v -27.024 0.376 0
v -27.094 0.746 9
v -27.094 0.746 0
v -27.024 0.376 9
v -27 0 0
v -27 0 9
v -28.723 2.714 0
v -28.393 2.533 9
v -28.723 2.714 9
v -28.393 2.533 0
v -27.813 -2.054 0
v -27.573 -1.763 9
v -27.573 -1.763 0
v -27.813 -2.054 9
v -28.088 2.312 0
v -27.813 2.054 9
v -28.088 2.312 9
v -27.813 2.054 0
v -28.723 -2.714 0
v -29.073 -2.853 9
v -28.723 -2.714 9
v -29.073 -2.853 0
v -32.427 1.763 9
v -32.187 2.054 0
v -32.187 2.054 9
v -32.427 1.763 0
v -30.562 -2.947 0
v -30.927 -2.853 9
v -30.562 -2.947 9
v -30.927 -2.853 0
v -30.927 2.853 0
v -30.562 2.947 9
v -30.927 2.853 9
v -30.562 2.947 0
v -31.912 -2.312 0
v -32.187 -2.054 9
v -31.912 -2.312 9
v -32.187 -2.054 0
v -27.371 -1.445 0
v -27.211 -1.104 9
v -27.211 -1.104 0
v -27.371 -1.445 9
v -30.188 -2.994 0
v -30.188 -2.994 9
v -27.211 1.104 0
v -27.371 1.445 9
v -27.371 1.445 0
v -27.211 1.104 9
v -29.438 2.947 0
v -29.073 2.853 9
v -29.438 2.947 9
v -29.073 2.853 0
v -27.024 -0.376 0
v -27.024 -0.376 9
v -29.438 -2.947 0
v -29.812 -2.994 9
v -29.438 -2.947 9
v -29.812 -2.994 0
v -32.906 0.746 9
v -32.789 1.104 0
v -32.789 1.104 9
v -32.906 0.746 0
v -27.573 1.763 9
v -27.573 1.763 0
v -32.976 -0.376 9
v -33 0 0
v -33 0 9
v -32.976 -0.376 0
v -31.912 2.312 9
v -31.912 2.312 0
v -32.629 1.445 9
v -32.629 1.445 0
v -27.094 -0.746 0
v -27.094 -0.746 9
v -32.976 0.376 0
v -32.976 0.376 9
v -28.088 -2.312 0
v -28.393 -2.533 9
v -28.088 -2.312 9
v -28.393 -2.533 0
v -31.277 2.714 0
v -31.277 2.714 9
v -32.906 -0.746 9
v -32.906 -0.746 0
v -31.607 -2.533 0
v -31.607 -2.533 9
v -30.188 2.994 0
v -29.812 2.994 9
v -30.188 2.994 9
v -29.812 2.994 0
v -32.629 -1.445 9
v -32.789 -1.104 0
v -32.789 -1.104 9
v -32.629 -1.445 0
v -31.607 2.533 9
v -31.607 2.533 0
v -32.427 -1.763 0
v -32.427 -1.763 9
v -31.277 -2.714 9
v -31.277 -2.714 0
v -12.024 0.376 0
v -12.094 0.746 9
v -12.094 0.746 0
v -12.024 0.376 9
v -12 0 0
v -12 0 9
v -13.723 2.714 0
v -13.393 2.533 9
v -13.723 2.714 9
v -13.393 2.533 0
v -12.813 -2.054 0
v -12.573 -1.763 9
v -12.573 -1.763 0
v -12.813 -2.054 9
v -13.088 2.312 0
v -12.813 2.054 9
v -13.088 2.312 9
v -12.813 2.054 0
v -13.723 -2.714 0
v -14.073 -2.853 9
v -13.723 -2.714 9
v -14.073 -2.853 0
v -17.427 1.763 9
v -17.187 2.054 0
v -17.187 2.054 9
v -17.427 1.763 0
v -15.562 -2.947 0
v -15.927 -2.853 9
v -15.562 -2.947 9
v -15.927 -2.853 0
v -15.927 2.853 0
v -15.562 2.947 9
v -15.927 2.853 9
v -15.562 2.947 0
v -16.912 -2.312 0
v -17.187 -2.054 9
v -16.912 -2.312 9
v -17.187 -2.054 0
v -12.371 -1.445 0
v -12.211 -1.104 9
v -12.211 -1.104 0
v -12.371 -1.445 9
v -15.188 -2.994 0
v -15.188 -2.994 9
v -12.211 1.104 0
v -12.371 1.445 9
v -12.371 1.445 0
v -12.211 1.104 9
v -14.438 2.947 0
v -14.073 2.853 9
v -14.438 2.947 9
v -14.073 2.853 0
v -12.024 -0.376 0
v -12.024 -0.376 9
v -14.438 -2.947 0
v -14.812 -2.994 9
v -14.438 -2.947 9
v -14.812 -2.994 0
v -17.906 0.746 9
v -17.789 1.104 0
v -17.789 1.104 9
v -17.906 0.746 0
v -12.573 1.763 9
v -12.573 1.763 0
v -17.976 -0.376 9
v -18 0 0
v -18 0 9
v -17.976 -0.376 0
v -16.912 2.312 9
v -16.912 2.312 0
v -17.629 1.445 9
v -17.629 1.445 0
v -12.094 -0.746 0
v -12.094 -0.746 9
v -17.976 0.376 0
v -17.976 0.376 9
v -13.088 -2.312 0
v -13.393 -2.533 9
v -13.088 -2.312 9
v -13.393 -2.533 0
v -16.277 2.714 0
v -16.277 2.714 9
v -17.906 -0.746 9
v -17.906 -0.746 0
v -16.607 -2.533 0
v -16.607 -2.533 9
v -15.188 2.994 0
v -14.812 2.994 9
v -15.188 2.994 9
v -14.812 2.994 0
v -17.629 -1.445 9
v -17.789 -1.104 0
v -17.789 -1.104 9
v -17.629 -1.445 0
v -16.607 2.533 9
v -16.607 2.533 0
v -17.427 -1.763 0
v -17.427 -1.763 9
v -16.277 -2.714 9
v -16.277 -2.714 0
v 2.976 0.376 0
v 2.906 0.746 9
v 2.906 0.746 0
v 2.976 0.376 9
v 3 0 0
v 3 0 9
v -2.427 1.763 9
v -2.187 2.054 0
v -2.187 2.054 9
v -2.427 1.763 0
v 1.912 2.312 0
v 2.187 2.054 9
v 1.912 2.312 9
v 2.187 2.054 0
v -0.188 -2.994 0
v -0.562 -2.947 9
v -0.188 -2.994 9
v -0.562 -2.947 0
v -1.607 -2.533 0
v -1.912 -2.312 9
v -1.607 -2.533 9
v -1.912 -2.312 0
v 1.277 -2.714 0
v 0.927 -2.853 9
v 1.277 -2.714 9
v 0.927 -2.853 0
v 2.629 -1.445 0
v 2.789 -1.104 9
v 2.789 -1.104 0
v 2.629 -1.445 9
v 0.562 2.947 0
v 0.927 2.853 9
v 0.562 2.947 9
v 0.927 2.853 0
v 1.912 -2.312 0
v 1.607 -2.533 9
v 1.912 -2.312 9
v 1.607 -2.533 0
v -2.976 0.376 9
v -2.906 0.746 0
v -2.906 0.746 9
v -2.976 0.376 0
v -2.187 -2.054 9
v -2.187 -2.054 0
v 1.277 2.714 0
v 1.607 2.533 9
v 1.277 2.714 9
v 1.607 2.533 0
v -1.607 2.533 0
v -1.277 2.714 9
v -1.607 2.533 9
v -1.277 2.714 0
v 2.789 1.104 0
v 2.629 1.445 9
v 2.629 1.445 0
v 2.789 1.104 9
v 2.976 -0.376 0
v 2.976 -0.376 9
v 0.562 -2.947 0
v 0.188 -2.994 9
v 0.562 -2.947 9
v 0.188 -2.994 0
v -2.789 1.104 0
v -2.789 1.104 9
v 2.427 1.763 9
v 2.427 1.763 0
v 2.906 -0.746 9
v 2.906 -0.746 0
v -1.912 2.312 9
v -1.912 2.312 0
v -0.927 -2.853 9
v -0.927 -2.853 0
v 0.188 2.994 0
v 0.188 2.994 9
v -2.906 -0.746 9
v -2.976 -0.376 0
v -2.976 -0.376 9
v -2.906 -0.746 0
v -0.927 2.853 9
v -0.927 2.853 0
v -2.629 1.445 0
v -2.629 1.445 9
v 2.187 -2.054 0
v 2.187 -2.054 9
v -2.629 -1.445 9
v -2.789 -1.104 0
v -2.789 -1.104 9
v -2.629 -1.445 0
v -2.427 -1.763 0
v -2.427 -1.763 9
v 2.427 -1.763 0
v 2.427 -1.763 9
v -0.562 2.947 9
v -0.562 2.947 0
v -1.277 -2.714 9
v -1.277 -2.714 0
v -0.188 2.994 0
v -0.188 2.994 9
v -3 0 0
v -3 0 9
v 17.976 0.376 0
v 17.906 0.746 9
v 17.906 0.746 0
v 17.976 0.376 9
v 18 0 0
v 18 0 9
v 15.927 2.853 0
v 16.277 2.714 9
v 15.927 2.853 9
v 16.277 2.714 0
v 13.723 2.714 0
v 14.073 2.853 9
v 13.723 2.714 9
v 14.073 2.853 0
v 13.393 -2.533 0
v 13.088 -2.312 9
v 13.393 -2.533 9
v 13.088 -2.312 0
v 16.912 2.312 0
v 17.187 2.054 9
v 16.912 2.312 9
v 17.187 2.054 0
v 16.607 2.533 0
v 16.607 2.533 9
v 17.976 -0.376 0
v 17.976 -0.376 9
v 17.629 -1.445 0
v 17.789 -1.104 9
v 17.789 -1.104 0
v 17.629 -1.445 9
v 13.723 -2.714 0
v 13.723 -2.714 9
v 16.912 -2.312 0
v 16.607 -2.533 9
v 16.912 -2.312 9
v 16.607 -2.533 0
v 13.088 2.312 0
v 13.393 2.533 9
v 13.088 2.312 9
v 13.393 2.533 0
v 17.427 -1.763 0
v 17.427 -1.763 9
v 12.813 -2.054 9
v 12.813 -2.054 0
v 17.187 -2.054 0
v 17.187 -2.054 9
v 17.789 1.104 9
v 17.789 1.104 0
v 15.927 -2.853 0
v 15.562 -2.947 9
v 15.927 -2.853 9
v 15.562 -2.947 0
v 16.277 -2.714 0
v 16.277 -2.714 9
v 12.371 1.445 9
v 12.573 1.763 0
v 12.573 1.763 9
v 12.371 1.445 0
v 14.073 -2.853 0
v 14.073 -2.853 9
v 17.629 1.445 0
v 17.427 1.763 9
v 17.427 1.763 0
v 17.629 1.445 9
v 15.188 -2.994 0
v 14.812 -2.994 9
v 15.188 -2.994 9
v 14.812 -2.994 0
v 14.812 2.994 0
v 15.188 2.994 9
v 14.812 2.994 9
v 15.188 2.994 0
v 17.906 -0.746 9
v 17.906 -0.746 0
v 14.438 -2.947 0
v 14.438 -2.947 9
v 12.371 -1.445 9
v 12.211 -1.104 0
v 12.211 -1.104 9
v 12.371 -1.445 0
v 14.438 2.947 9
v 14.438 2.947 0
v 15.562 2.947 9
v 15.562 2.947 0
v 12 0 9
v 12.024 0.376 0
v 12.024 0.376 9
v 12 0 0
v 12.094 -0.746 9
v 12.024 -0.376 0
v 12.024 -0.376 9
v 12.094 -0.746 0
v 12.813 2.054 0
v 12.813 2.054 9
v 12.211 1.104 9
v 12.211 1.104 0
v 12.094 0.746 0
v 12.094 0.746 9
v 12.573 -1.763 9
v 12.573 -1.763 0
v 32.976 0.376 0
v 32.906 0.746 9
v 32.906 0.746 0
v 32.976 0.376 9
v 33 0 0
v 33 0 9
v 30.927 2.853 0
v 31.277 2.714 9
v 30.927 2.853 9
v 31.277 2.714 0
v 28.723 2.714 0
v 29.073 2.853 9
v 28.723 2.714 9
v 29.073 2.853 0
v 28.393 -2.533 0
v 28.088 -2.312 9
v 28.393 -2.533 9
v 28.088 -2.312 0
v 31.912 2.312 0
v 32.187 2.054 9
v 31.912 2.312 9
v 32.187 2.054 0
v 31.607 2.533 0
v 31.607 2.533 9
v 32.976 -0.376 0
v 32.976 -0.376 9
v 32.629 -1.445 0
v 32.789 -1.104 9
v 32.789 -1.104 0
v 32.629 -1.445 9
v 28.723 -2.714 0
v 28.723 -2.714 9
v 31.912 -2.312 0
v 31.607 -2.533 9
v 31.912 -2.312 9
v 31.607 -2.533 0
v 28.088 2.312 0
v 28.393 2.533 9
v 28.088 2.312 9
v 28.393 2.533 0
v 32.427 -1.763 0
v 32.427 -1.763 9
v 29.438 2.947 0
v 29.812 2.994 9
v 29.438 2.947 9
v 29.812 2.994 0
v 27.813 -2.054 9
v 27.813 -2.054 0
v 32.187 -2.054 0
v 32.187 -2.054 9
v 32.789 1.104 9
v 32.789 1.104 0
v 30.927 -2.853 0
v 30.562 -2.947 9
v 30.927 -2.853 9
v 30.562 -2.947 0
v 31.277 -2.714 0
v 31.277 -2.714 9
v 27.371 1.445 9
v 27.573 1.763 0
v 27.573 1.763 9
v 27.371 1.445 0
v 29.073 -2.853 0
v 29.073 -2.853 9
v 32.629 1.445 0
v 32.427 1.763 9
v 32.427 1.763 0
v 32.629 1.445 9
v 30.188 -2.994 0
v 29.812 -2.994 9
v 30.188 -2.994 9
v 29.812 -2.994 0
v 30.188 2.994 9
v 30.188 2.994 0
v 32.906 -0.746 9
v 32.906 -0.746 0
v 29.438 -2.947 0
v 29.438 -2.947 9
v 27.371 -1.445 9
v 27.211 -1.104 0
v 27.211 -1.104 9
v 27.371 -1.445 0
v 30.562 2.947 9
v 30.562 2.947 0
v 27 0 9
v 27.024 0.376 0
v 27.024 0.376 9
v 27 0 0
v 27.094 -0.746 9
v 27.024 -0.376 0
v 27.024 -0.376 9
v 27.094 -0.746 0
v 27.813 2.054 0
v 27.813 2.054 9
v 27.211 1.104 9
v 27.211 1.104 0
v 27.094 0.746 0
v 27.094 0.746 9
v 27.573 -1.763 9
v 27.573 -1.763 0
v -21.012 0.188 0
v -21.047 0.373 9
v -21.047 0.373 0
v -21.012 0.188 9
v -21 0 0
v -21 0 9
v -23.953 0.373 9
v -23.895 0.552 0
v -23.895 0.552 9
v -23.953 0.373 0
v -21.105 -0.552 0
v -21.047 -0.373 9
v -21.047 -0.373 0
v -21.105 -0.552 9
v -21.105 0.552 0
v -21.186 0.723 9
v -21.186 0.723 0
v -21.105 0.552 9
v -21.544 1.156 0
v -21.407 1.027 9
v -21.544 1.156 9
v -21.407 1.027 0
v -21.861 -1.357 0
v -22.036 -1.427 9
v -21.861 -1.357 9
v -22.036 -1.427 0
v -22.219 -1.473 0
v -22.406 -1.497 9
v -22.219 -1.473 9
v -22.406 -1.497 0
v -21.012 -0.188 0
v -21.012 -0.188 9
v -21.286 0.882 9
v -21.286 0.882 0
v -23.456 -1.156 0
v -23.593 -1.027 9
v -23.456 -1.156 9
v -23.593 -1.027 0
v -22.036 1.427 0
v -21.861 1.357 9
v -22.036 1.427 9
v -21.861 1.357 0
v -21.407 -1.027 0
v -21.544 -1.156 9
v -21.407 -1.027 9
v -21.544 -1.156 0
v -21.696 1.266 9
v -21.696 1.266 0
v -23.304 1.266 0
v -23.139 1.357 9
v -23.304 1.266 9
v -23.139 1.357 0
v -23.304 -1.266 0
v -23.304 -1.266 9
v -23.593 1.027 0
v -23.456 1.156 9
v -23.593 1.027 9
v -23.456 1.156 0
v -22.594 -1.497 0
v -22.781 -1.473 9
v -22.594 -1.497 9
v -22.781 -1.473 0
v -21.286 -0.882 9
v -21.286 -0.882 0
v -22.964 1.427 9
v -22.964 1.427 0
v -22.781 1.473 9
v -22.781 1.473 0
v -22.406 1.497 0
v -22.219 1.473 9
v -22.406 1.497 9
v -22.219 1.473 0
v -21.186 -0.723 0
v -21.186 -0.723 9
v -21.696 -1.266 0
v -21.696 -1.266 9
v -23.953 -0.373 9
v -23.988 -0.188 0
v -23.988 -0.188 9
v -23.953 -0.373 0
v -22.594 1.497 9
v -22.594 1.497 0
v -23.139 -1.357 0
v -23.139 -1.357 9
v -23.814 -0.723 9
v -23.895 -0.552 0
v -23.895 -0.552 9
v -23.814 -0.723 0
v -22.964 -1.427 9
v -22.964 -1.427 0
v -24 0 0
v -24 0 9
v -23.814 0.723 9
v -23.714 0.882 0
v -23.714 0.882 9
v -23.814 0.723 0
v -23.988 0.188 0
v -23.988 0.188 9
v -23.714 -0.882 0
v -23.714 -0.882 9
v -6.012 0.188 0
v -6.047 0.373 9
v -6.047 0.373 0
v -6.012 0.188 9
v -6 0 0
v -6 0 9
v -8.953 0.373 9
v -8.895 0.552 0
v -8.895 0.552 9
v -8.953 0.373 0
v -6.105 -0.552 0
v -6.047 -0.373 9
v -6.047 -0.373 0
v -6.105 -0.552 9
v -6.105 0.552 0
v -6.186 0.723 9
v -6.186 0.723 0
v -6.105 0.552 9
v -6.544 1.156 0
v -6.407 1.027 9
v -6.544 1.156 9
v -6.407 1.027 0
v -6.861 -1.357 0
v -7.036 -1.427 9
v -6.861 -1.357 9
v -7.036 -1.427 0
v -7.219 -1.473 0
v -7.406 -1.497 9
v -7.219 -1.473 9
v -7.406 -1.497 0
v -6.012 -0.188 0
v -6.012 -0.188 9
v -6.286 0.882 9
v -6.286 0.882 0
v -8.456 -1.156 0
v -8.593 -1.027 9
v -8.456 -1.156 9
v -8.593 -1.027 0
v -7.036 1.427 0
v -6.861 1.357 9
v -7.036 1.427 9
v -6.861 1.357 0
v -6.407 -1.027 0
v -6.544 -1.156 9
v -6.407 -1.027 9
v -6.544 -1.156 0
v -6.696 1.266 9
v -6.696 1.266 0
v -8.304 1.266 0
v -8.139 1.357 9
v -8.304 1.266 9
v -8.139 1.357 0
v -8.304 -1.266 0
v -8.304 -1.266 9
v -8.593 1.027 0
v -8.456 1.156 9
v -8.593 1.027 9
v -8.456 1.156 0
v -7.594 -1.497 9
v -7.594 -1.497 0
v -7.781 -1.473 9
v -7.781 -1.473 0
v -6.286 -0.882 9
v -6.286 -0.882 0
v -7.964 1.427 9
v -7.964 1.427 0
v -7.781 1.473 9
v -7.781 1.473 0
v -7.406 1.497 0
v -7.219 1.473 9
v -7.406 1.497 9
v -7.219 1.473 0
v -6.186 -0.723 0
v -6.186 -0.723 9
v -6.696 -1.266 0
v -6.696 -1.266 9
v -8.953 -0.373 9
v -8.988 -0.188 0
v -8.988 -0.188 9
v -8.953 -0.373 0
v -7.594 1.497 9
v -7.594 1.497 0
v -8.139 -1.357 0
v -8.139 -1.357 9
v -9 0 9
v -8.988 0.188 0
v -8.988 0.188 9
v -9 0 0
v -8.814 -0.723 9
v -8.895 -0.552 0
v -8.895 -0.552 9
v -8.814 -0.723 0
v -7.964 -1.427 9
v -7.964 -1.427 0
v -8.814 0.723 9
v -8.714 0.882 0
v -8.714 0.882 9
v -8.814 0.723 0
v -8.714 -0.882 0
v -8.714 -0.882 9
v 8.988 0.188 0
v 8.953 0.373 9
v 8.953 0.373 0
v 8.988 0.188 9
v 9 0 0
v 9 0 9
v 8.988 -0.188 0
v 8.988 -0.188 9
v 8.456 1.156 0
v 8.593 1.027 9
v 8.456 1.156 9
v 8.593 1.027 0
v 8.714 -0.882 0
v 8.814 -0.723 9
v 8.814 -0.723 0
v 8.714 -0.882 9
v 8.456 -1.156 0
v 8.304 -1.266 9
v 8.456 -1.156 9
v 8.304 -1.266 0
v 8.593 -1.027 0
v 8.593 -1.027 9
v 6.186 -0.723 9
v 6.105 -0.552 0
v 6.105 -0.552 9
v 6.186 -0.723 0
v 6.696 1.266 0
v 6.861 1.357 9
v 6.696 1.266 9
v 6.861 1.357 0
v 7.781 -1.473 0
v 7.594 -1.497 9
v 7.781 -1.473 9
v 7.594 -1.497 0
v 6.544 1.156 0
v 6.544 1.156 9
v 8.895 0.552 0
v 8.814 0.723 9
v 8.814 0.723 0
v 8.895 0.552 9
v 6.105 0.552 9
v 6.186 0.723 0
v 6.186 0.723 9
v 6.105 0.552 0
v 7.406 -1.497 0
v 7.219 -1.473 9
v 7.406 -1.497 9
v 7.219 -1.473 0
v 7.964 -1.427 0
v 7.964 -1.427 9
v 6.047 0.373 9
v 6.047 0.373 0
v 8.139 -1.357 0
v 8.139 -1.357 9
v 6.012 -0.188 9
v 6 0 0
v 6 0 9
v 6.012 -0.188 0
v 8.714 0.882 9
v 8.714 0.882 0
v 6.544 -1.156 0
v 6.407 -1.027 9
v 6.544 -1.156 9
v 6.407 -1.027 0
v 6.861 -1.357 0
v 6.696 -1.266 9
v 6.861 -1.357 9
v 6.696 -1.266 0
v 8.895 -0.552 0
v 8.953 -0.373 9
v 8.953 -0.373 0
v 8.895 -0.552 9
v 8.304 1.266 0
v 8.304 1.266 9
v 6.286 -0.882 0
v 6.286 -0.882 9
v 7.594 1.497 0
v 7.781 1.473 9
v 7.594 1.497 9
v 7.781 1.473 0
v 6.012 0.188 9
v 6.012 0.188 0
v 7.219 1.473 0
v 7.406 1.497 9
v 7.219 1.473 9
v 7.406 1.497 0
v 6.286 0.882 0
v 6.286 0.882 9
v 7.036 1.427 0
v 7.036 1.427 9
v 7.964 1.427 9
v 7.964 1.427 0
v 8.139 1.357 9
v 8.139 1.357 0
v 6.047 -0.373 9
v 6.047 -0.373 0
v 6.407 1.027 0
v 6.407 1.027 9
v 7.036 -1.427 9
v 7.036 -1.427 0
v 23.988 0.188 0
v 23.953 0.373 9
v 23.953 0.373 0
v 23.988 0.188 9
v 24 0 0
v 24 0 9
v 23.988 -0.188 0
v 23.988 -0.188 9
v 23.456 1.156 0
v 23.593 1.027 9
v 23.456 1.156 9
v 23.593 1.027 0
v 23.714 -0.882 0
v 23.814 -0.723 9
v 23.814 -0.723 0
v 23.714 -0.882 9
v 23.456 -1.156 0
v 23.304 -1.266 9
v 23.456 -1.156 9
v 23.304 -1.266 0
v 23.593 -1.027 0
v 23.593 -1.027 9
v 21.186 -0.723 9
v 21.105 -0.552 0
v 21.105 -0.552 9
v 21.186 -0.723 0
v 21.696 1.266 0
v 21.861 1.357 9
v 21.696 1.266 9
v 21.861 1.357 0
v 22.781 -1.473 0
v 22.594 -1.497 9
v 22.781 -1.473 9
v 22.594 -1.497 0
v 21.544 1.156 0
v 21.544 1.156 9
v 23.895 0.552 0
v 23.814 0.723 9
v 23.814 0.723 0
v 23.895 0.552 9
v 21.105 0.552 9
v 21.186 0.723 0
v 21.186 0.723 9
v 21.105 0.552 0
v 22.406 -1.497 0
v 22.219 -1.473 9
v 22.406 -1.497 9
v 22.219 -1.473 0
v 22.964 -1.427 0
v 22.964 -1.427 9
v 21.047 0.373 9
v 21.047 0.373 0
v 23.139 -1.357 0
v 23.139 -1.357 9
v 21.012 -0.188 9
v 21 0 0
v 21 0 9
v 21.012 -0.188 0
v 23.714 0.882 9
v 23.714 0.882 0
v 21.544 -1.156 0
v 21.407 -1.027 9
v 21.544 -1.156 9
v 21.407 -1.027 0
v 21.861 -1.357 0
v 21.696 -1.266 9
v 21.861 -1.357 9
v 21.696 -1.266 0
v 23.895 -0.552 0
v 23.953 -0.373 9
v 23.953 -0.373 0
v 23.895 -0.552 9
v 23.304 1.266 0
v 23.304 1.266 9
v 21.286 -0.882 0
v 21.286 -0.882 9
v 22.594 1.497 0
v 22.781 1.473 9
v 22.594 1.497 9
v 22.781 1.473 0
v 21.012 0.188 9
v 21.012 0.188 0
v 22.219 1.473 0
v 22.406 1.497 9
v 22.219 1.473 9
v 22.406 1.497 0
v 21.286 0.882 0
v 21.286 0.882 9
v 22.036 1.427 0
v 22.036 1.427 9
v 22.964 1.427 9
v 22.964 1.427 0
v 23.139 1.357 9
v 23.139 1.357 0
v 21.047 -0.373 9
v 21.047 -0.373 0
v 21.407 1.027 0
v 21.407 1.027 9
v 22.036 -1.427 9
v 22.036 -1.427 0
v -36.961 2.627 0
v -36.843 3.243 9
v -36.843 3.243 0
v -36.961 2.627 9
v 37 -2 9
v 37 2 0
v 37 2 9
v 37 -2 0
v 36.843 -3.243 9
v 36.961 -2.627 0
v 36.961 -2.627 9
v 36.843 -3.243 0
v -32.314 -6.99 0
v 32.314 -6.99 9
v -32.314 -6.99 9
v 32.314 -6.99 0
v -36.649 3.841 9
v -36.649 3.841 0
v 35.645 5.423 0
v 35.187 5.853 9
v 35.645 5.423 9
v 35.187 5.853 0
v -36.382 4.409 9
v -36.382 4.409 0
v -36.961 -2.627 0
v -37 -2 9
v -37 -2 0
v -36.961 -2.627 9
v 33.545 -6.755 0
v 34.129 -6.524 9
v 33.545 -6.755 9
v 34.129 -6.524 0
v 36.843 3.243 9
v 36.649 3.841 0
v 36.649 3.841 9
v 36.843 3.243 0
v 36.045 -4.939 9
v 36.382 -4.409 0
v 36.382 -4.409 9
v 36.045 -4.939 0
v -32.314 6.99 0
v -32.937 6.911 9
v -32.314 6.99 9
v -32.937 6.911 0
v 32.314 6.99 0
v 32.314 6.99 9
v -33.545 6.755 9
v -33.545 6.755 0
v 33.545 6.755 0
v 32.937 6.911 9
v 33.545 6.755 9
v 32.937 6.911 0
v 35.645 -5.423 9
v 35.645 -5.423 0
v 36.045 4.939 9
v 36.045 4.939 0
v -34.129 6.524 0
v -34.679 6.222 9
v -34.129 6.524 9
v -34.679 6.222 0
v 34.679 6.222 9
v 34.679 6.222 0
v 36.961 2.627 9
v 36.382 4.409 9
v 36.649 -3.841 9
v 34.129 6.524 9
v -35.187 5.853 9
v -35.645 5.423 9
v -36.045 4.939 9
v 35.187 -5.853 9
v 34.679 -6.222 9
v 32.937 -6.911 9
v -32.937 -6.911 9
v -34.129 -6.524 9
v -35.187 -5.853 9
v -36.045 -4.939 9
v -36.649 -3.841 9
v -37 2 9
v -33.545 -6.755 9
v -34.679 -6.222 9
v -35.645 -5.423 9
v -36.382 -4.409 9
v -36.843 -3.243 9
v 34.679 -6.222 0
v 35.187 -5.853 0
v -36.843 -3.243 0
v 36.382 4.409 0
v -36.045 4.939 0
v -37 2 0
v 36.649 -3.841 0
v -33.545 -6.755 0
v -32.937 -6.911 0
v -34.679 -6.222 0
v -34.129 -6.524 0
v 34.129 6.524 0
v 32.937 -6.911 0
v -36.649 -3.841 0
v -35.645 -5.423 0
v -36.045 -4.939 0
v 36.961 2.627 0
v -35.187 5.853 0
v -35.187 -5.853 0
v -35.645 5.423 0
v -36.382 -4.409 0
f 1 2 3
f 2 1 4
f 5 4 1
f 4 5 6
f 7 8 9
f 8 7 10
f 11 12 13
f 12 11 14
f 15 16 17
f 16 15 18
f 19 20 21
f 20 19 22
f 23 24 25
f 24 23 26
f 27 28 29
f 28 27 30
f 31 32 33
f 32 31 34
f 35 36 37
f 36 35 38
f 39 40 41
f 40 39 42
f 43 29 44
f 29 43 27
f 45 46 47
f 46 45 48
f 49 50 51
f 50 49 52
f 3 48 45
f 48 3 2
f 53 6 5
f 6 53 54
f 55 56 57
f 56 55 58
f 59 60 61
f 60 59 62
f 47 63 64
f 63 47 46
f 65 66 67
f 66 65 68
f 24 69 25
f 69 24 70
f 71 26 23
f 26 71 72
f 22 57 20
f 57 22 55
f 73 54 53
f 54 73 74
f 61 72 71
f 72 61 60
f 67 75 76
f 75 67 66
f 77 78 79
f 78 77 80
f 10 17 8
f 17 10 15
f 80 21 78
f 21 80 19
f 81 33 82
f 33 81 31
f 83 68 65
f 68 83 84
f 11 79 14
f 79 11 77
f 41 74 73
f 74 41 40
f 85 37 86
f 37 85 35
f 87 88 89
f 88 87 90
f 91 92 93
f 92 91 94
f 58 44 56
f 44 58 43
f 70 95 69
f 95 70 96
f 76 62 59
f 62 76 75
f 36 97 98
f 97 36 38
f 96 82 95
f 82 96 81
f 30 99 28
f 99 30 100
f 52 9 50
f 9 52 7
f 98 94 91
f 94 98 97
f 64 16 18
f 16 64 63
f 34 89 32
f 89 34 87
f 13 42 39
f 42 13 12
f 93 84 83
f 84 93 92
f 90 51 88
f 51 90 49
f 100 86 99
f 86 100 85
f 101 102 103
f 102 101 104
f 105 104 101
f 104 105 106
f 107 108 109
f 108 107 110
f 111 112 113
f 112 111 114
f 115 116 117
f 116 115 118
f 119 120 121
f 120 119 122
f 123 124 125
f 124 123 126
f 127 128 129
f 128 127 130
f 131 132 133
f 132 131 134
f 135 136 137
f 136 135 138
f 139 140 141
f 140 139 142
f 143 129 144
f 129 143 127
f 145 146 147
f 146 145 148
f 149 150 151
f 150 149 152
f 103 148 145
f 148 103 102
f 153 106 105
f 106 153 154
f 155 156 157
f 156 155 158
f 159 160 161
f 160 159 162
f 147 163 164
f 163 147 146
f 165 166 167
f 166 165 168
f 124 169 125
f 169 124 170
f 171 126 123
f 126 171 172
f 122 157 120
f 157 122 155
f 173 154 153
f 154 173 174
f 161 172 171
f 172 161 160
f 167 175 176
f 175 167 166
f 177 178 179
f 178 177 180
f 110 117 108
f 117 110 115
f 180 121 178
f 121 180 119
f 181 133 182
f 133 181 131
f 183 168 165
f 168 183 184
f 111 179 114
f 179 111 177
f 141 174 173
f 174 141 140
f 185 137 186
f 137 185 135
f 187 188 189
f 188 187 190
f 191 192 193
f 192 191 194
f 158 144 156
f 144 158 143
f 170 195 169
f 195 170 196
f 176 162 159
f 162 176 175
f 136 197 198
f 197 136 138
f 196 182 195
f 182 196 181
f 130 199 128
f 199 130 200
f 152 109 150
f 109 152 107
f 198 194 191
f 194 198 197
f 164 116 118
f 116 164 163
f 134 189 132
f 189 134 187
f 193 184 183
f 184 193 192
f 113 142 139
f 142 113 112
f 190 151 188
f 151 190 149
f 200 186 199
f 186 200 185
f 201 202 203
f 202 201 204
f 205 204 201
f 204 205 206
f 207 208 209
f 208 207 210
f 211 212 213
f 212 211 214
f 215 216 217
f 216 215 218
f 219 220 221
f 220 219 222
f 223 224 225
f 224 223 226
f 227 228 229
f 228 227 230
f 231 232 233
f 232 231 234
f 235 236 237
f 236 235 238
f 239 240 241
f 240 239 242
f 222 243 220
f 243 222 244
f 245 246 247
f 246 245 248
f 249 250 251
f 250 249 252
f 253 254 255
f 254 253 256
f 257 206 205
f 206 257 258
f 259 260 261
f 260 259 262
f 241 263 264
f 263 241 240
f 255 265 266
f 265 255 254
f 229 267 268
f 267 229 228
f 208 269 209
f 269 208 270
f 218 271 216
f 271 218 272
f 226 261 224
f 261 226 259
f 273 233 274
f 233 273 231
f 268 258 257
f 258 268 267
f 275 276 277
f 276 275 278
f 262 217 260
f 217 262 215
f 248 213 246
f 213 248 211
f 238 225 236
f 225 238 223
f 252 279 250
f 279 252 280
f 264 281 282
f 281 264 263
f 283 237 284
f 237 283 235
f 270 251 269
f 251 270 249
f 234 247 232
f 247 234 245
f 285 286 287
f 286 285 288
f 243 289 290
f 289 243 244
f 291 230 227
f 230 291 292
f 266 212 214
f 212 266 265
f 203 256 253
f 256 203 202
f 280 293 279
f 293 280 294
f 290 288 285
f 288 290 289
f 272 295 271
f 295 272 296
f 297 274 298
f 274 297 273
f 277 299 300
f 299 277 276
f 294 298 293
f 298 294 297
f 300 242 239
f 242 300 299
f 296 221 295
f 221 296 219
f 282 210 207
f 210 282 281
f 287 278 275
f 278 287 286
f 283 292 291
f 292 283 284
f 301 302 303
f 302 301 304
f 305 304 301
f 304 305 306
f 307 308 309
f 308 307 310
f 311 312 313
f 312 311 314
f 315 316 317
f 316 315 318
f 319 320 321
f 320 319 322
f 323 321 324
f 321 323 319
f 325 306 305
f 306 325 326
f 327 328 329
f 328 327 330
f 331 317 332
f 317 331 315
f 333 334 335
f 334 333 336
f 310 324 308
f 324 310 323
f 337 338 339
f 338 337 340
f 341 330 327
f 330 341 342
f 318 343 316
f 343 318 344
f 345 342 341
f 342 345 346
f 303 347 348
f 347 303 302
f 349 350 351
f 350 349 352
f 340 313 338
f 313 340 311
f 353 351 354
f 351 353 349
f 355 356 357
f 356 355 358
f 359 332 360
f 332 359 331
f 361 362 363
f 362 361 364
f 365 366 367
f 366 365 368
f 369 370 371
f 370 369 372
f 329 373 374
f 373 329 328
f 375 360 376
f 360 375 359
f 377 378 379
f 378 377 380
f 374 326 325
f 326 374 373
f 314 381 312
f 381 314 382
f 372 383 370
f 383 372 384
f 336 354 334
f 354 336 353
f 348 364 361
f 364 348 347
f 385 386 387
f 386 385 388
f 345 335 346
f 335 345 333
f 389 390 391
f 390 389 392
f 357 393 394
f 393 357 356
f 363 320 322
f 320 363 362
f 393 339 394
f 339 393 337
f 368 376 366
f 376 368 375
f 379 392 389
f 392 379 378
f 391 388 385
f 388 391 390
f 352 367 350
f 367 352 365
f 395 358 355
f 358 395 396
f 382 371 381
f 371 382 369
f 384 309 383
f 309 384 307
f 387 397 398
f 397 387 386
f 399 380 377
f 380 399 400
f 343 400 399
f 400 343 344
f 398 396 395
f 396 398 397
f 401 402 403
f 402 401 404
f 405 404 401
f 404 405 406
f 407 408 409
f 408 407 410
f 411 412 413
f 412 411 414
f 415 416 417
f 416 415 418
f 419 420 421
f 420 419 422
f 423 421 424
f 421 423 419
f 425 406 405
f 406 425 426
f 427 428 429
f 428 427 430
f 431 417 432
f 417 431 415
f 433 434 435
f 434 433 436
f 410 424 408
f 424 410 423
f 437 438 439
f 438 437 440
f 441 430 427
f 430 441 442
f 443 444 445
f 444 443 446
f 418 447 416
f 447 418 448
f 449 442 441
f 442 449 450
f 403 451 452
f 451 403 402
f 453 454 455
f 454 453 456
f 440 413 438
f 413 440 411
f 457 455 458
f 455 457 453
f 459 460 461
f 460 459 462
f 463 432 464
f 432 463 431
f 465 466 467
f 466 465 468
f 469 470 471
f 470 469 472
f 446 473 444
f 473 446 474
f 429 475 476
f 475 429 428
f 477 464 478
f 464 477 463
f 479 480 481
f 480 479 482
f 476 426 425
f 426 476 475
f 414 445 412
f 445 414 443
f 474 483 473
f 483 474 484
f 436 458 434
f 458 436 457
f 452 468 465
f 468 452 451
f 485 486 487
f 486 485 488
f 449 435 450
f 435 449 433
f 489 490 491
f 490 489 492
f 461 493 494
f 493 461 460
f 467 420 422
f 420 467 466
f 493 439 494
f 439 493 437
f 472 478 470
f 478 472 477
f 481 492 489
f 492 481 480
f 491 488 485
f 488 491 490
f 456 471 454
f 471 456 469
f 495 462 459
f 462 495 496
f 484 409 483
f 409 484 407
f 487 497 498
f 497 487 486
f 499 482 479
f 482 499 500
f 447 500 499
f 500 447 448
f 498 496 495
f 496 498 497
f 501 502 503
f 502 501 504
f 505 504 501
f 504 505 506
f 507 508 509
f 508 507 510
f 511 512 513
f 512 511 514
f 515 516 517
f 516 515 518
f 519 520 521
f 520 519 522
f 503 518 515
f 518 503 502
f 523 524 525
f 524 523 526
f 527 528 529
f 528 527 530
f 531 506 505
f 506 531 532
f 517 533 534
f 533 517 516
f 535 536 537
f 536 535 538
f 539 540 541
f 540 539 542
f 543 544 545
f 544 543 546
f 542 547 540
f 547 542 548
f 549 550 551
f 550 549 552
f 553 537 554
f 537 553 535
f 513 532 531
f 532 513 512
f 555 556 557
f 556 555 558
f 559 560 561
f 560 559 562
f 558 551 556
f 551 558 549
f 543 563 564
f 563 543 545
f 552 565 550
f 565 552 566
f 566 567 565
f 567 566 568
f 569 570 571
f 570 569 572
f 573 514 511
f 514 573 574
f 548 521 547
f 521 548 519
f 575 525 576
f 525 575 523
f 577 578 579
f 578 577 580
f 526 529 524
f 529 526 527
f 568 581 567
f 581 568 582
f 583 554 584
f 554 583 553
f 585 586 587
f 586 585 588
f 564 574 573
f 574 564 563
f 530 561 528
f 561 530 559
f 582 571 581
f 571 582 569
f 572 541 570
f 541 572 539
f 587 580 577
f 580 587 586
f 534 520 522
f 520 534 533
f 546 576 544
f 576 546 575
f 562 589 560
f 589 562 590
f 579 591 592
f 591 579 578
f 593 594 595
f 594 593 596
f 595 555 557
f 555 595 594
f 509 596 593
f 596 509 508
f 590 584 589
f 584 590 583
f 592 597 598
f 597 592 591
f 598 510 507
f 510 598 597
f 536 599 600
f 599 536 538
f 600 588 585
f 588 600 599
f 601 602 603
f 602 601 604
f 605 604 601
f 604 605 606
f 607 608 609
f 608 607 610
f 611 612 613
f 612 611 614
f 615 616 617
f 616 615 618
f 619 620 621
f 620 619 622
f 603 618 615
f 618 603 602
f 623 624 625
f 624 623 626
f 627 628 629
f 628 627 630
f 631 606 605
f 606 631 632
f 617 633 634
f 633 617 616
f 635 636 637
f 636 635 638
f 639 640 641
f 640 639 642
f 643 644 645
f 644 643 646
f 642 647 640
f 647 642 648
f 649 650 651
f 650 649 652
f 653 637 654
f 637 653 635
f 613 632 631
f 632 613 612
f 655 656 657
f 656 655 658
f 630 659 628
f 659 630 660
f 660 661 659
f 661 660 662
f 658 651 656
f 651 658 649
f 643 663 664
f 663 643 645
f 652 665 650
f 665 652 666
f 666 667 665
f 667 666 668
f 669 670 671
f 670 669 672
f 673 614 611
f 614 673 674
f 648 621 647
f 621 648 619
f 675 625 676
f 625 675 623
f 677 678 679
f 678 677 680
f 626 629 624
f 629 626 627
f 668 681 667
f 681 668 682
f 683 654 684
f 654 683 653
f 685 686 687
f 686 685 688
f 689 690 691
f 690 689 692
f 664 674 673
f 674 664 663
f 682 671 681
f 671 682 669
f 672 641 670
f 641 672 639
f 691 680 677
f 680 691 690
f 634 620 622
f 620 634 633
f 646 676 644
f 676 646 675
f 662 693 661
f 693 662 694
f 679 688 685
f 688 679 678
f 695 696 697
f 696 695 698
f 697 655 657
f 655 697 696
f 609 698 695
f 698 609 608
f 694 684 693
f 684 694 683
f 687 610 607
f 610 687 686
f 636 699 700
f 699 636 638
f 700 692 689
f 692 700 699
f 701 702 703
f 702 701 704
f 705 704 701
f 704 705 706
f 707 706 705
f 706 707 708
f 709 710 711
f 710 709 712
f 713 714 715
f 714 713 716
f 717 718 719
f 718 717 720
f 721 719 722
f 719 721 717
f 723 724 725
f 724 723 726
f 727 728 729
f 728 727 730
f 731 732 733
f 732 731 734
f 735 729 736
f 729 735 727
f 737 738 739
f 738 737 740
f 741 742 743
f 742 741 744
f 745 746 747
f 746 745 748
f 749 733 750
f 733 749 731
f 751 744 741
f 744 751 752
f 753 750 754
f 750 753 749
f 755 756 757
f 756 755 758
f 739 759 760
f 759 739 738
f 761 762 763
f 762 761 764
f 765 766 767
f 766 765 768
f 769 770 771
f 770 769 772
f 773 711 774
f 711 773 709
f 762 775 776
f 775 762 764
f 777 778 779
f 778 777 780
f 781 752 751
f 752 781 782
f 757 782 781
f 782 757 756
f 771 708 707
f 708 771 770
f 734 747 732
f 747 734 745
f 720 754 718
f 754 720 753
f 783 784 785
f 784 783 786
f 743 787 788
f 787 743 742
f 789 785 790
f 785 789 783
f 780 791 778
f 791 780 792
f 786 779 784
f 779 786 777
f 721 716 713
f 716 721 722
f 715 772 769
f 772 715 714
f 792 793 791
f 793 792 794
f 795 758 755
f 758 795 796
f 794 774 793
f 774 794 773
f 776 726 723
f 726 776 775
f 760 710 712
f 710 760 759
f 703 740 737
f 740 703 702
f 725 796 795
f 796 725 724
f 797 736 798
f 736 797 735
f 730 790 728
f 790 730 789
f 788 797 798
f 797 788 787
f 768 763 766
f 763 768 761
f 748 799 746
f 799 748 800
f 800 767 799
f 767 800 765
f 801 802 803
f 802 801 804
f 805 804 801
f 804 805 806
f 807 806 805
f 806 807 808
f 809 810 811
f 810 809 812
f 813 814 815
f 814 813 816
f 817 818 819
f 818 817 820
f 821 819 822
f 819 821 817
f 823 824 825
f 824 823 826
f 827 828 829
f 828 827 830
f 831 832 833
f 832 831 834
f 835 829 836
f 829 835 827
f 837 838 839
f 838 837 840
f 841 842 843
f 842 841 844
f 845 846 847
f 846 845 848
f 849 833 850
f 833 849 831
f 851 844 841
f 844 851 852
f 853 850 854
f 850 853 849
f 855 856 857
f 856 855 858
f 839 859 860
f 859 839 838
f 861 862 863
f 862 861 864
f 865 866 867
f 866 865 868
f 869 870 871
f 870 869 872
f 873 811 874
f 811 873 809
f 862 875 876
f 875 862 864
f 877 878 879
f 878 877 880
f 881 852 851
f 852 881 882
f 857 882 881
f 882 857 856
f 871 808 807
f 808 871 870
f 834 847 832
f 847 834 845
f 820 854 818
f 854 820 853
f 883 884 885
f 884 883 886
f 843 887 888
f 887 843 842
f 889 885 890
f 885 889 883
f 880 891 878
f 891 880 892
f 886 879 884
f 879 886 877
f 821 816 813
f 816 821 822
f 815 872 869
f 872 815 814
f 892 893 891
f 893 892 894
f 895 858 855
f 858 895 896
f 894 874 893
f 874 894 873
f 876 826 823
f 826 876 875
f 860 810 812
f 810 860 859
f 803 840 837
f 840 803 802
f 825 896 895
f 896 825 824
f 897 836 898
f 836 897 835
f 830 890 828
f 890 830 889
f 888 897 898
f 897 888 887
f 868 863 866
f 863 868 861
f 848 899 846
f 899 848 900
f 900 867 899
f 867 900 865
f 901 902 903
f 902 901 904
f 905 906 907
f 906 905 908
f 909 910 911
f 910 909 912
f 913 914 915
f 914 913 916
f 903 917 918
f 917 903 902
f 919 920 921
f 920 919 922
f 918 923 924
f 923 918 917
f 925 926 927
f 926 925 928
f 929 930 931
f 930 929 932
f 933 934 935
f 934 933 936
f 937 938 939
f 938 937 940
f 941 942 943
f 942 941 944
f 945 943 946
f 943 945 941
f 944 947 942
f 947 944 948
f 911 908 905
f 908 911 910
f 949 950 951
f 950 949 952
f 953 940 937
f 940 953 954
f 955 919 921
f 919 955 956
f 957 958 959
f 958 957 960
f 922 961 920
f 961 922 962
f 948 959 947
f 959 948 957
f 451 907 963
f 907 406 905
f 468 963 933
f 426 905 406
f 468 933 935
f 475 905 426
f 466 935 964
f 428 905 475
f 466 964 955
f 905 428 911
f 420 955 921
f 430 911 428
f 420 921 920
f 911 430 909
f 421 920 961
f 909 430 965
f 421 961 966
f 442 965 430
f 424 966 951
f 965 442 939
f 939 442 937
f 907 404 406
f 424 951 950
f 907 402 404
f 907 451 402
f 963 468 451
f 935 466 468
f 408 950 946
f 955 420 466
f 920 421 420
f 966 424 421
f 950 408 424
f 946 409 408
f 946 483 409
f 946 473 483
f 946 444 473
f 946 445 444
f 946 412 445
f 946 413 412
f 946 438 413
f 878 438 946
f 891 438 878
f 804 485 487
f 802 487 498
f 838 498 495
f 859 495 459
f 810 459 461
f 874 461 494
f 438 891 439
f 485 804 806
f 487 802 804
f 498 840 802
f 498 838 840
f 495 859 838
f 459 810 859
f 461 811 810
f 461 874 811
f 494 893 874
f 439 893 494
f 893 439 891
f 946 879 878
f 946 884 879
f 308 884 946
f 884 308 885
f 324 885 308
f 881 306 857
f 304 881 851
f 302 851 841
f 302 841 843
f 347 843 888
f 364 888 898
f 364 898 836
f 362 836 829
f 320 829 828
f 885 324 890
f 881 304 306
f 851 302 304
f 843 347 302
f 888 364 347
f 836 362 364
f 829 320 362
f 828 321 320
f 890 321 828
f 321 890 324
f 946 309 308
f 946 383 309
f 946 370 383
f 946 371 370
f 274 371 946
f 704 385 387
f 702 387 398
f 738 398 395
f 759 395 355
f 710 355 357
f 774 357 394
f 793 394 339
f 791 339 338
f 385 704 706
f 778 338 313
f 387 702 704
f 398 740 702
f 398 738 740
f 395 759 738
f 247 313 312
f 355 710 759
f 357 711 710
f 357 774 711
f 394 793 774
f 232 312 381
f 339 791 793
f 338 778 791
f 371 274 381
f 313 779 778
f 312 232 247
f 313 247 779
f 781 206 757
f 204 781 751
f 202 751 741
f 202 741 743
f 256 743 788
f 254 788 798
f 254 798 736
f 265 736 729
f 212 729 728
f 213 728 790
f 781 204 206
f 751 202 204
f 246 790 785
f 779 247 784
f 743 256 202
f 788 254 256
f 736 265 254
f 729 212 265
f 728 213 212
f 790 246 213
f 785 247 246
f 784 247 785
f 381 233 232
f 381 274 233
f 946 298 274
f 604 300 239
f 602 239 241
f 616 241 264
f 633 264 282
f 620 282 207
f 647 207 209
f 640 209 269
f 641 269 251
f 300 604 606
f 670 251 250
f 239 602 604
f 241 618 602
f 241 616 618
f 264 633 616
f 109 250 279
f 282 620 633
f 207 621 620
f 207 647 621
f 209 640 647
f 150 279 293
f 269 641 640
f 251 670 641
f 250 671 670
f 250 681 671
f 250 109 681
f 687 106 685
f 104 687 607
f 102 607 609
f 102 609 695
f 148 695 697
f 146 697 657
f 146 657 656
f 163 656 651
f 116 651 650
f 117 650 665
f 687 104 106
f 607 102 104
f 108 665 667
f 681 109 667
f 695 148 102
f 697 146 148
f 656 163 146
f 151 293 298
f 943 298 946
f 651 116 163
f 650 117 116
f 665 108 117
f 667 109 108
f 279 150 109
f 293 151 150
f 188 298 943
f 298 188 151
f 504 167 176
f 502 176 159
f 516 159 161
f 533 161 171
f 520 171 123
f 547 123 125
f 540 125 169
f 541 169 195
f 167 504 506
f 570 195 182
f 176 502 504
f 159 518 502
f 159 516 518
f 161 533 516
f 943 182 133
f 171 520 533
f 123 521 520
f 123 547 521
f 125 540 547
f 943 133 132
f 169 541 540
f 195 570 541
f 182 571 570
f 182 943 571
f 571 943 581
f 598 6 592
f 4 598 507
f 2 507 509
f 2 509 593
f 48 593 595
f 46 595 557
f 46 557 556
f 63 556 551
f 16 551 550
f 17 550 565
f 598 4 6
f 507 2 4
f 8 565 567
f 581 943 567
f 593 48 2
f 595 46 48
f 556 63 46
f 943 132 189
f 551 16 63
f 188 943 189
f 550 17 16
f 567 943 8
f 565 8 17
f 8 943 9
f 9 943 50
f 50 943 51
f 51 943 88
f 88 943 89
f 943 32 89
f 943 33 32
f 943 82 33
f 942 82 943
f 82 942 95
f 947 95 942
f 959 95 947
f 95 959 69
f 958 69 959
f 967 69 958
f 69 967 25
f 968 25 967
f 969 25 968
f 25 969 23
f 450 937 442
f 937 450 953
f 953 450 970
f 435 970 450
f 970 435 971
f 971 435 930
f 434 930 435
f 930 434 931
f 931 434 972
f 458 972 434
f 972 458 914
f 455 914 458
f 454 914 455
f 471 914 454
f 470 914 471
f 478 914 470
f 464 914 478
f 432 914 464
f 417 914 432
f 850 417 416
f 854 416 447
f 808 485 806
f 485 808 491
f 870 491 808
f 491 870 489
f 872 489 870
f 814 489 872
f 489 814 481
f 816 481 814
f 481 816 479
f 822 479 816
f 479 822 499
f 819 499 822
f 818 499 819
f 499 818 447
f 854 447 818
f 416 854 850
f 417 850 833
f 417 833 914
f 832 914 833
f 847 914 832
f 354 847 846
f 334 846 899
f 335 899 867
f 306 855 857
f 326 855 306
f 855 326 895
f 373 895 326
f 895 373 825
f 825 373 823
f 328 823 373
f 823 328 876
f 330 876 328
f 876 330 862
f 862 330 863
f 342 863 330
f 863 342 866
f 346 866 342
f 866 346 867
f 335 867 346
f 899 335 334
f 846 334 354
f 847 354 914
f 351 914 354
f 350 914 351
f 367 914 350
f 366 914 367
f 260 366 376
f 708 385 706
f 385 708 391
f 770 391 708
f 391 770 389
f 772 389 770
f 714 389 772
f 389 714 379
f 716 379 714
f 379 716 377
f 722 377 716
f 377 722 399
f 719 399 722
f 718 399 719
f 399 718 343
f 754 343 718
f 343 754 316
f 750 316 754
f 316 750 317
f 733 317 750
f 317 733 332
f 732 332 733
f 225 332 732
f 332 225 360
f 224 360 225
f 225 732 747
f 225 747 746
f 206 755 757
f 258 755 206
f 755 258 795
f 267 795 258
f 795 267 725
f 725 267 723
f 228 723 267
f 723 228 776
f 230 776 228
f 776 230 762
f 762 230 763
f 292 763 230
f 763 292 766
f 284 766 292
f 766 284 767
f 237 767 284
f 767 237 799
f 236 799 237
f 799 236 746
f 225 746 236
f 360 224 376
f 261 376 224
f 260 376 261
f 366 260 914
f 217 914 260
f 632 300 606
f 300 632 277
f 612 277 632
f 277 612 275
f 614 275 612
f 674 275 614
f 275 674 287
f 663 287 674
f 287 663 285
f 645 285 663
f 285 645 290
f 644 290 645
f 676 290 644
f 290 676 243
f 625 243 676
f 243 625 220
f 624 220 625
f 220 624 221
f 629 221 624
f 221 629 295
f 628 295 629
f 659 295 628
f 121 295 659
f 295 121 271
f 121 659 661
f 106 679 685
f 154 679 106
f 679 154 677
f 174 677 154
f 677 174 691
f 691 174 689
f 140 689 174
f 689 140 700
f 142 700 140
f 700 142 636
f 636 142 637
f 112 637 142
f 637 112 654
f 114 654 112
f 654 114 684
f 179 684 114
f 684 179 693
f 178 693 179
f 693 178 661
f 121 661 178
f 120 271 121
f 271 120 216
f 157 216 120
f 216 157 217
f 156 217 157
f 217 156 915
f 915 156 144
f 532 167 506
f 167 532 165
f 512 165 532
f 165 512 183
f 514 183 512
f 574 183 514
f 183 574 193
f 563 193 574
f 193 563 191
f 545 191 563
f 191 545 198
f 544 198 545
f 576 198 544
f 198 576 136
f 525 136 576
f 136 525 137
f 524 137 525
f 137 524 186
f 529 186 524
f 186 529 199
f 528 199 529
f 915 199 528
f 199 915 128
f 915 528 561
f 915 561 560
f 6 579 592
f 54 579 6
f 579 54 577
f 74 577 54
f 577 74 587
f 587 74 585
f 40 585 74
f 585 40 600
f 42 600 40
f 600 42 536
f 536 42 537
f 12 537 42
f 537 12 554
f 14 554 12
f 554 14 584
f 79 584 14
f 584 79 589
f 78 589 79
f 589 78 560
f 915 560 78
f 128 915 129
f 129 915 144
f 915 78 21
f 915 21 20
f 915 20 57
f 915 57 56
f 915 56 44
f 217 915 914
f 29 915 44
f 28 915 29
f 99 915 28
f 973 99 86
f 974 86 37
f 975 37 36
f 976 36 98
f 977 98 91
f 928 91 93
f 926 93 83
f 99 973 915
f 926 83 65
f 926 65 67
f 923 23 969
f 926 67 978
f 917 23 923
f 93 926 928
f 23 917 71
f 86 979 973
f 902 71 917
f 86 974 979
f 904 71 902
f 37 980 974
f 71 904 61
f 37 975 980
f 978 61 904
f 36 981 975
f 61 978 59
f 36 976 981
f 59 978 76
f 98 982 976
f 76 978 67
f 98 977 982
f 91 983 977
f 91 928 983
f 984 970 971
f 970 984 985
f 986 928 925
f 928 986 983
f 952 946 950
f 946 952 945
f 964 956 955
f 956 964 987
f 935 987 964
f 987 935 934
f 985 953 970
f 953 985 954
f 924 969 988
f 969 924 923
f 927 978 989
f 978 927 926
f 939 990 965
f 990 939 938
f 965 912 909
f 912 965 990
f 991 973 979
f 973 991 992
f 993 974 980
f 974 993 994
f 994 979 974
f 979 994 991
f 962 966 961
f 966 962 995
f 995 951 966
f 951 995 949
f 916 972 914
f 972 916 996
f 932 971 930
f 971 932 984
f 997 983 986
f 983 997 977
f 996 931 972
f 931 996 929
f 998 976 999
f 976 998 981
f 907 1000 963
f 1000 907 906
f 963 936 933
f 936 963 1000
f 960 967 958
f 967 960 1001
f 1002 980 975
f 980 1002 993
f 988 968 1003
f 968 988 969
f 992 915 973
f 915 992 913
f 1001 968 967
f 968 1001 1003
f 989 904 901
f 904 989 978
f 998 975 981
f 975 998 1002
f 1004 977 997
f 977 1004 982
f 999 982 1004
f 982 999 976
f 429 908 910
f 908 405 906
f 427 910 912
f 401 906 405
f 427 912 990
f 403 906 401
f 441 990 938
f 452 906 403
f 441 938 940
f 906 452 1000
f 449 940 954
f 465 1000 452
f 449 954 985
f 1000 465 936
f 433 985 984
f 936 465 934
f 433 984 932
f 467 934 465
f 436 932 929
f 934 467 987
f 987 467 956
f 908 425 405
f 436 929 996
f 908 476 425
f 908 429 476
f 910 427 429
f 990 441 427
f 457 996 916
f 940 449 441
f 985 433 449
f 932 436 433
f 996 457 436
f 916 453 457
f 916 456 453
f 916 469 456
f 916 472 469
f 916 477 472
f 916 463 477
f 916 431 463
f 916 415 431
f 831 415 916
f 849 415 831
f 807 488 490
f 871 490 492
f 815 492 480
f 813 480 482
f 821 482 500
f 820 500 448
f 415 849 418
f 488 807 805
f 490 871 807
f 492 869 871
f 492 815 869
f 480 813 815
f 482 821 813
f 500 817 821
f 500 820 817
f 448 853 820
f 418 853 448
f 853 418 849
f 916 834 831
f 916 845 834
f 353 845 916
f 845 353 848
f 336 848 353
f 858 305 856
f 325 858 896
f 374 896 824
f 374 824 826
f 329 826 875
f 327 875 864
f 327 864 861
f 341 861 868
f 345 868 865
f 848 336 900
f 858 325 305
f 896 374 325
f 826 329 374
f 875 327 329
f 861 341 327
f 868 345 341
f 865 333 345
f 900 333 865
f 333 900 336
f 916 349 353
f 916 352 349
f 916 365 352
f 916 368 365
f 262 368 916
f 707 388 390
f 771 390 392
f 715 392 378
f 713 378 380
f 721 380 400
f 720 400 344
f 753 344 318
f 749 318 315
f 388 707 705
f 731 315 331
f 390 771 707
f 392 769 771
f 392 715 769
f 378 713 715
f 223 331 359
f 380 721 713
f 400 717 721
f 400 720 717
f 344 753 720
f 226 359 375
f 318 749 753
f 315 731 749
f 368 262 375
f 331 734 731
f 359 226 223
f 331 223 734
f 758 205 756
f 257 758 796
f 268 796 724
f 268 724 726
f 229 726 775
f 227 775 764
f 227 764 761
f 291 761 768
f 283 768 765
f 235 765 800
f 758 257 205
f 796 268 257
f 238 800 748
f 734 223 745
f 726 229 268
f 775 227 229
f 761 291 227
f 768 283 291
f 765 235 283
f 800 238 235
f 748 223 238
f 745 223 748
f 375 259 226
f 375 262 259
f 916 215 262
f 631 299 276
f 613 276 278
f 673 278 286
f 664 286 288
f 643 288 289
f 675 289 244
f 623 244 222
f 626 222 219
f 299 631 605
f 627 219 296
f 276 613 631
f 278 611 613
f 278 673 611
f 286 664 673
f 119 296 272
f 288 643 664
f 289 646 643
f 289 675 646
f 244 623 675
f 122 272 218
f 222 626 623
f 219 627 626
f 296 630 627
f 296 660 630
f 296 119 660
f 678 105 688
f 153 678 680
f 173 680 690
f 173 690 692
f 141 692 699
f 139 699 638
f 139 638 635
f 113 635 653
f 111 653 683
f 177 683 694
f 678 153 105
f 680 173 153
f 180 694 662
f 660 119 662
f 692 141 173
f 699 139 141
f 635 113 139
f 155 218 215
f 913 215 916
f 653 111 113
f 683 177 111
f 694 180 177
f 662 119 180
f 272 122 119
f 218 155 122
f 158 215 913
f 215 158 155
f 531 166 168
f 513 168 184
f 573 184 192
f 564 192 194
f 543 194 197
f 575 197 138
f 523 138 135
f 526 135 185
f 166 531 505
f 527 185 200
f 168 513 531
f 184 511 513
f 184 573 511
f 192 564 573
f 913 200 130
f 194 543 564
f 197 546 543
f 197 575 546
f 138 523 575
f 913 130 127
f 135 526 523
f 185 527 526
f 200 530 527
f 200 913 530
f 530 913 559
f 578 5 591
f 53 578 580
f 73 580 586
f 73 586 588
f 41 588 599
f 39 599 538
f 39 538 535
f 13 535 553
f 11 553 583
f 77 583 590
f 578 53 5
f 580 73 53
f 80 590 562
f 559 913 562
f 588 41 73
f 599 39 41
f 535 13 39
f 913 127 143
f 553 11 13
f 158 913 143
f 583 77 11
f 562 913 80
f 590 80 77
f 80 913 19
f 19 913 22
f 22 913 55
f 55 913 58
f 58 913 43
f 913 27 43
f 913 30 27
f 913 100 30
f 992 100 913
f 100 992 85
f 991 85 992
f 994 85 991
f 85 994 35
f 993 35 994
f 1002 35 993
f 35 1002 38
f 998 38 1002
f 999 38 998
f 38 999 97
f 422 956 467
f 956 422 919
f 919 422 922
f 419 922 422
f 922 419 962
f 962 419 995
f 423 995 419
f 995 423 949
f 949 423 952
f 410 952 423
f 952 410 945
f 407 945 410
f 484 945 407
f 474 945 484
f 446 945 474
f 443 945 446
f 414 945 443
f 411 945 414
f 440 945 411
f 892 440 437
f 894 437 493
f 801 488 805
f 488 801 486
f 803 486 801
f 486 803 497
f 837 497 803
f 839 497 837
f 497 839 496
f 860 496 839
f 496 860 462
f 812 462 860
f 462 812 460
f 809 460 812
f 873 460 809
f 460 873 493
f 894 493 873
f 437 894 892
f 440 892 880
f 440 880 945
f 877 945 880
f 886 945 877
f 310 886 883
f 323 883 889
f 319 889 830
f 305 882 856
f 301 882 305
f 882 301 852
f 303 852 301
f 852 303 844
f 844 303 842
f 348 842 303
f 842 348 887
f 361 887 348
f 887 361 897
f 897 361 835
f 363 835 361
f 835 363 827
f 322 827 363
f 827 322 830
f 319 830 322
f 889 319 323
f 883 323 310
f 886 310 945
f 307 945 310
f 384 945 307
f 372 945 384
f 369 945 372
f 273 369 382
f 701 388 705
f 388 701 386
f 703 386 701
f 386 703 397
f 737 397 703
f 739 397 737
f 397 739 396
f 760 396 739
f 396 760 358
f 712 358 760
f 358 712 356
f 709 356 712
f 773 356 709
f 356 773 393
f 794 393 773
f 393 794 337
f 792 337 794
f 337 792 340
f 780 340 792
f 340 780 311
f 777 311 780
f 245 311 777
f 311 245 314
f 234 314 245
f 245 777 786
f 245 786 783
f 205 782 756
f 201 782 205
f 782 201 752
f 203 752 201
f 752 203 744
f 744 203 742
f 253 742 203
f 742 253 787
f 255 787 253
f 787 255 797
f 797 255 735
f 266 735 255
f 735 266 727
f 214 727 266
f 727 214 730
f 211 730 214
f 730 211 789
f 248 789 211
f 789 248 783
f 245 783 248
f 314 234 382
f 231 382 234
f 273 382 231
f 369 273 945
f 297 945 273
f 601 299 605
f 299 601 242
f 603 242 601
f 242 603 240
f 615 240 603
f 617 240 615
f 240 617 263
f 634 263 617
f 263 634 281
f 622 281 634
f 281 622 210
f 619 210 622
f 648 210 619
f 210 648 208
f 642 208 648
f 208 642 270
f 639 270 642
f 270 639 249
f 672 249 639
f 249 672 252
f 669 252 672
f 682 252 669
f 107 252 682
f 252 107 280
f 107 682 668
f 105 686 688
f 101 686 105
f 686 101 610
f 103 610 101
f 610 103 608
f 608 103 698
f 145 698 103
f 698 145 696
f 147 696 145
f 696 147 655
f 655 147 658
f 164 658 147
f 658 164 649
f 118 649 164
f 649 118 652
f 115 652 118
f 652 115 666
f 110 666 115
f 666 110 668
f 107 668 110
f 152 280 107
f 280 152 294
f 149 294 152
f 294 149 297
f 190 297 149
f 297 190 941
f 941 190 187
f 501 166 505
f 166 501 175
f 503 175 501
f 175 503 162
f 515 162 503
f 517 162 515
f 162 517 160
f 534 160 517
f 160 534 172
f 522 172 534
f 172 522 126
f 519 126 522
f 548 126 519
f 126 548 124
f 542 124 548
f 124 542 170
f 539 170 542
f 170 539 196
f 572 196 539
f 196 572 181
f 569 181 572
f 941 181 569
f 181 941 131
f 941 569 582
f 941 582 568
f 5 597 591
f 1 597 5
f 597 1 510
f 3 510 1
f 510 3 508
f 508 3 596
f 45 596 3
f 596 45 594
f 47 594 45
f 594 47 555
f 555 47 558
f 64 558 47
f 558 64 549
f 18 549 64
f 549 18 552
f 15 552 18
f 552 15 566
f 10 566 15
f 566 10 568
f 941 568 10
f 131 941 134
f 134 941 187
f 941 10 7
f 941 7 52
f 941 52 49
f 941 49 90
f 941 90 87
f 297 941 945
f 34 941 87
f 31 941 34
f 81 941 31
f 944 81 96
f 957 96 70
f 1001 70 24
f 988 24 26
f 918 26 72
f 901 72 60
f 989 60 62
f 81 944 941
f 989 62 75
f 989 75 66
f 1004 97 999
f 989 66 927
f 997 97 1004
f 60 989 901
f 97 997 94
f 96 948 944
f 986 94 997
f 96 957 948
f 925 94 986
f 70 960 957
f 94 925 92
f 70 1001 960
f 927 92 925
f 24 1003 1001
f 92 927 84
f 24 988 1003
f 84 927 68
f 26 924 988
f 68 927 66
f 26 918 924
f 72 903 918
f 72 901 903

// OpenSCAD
$fn = 50;


difference() {
	union() {
		*color(alpha = 1.0000000000, c = "gray") {
			translate(v = [0, 7, 0]) {
				linear_extrude(height = 1) {
					text(font = "Arial:style=Bold", halign = "center", size = 4.5000000000, text = "COMMENT plate main", valign = "center");
				}
			}
		}
		hull() {
			translate(v = [-32.0000000000, 2.0000000000, 0]) {
				cylinder(h = 9, r = 5);
			}
			translate(v = [32.0000000000, 2.0000000000, 0]) {
				cylinder(h = 9, r = 5);
			}
			translate(v = [-32.0000000000, -2.0000000000, 0]) {
				cylinder(h = 9, r = 5);
			}
			translate(v = [32.0000000000, -2.0000000000, 0]) {
				cylinder(h = 9, r = 5);
			}
		}
	}
	union() {
		*color(alpha = 1.0000000000, c = "gray") {
			translate(v = [0, 7, 0]) {
				linear_extrude(height = 1) {
					text(font = "Arial:style=Bold", halign = "center", size = 4.5000000000, text = "COMMENT holes main", valign = "center");
				}
			}
		}
		translate(v = [-30.0000000000, 0.0000000000, 0]) {
			translate(v = [0, 0, -100]) {
				cylinder(h = 200, r = 3.0000000000);
			}
		}
		translate(v = [-15.0000000000, 0.0000000000, 0]) {
			translate(v = [0, 0, -100]) {
				cylinder(h = 200, r = 3.0000000000);
			}
		}
		translate(v = [0, 0, -100]) {
			cylinder(h = 200, r = 3.0000000000);
		}
		translate(v = [15.0000000000, 0.0000000000, 0]) {
			translate(v = [0, 0, -100]) {
				cylinder(h = 200, r = 3.0000000000);
			}
		}
		translate(v = [30.0000000000, 0.0000000000, 0]) {
			translate(v = [0, 0, -100]) {
				cylinder(h = 200, r = 3.0000000000);
			}
		}
		translate(v = [-30.0000000000, 0.0000000000, 0]) {
			translate(v = [0, 0, -100]) {
				cylinder(h = 200, r = 1.5000000000);
			}
		}
		translate(v = [-22.5000000000, 0.0000000000, 0]) {
			translate(v = [0, 0, -100]) {
				cylinder(h = 200, r = 1.5000000000);
			}
		}
		translate(v = [-15.0000000000, 0.0000000000, 0]) {
			translate(v = [0, 0, -100]) {
				cylinder(h = 200, r = 1.5000000000);
			}
		}
		translate(v = [-7.5000000000, 0.0000000000, 0]) {
			translate(v = [0, 0, -100]) {
				cylinder(h = 200, r = 1.5000000000);
			}
		}
		translate(v = [0, 0, -100]) {
			cylinder(h = 200, r = 1.5000000000);
		}
		translate(v = [7.5000000000, 0.0000000000, 0]) {
			translate(v = [0, 0, -100]) {
				cylinder(h = 200, r = 1.5000000000);
			}
		}
		translate(v = [15.0000000000, 0.0000000000, 0]) {
			translate(v = [0, 0, -100]) {
				cylinder(h = 200, r = 1.5000000000);
			}
		}
		translate(v = [22.5000000000, 0.0000000000, 0]) {
			translate(v = [0, 0, -100]) {
				cylinder(h = 200, r = 1.5000000000);
			}
		}
		translate(v = [30.0000000000, 0.0000000000, 0]) {
			translate(v = [0, 0, -100]) {
				cylinder(h = 200, r = 1.5000000000);
			}
		}
	}
}
